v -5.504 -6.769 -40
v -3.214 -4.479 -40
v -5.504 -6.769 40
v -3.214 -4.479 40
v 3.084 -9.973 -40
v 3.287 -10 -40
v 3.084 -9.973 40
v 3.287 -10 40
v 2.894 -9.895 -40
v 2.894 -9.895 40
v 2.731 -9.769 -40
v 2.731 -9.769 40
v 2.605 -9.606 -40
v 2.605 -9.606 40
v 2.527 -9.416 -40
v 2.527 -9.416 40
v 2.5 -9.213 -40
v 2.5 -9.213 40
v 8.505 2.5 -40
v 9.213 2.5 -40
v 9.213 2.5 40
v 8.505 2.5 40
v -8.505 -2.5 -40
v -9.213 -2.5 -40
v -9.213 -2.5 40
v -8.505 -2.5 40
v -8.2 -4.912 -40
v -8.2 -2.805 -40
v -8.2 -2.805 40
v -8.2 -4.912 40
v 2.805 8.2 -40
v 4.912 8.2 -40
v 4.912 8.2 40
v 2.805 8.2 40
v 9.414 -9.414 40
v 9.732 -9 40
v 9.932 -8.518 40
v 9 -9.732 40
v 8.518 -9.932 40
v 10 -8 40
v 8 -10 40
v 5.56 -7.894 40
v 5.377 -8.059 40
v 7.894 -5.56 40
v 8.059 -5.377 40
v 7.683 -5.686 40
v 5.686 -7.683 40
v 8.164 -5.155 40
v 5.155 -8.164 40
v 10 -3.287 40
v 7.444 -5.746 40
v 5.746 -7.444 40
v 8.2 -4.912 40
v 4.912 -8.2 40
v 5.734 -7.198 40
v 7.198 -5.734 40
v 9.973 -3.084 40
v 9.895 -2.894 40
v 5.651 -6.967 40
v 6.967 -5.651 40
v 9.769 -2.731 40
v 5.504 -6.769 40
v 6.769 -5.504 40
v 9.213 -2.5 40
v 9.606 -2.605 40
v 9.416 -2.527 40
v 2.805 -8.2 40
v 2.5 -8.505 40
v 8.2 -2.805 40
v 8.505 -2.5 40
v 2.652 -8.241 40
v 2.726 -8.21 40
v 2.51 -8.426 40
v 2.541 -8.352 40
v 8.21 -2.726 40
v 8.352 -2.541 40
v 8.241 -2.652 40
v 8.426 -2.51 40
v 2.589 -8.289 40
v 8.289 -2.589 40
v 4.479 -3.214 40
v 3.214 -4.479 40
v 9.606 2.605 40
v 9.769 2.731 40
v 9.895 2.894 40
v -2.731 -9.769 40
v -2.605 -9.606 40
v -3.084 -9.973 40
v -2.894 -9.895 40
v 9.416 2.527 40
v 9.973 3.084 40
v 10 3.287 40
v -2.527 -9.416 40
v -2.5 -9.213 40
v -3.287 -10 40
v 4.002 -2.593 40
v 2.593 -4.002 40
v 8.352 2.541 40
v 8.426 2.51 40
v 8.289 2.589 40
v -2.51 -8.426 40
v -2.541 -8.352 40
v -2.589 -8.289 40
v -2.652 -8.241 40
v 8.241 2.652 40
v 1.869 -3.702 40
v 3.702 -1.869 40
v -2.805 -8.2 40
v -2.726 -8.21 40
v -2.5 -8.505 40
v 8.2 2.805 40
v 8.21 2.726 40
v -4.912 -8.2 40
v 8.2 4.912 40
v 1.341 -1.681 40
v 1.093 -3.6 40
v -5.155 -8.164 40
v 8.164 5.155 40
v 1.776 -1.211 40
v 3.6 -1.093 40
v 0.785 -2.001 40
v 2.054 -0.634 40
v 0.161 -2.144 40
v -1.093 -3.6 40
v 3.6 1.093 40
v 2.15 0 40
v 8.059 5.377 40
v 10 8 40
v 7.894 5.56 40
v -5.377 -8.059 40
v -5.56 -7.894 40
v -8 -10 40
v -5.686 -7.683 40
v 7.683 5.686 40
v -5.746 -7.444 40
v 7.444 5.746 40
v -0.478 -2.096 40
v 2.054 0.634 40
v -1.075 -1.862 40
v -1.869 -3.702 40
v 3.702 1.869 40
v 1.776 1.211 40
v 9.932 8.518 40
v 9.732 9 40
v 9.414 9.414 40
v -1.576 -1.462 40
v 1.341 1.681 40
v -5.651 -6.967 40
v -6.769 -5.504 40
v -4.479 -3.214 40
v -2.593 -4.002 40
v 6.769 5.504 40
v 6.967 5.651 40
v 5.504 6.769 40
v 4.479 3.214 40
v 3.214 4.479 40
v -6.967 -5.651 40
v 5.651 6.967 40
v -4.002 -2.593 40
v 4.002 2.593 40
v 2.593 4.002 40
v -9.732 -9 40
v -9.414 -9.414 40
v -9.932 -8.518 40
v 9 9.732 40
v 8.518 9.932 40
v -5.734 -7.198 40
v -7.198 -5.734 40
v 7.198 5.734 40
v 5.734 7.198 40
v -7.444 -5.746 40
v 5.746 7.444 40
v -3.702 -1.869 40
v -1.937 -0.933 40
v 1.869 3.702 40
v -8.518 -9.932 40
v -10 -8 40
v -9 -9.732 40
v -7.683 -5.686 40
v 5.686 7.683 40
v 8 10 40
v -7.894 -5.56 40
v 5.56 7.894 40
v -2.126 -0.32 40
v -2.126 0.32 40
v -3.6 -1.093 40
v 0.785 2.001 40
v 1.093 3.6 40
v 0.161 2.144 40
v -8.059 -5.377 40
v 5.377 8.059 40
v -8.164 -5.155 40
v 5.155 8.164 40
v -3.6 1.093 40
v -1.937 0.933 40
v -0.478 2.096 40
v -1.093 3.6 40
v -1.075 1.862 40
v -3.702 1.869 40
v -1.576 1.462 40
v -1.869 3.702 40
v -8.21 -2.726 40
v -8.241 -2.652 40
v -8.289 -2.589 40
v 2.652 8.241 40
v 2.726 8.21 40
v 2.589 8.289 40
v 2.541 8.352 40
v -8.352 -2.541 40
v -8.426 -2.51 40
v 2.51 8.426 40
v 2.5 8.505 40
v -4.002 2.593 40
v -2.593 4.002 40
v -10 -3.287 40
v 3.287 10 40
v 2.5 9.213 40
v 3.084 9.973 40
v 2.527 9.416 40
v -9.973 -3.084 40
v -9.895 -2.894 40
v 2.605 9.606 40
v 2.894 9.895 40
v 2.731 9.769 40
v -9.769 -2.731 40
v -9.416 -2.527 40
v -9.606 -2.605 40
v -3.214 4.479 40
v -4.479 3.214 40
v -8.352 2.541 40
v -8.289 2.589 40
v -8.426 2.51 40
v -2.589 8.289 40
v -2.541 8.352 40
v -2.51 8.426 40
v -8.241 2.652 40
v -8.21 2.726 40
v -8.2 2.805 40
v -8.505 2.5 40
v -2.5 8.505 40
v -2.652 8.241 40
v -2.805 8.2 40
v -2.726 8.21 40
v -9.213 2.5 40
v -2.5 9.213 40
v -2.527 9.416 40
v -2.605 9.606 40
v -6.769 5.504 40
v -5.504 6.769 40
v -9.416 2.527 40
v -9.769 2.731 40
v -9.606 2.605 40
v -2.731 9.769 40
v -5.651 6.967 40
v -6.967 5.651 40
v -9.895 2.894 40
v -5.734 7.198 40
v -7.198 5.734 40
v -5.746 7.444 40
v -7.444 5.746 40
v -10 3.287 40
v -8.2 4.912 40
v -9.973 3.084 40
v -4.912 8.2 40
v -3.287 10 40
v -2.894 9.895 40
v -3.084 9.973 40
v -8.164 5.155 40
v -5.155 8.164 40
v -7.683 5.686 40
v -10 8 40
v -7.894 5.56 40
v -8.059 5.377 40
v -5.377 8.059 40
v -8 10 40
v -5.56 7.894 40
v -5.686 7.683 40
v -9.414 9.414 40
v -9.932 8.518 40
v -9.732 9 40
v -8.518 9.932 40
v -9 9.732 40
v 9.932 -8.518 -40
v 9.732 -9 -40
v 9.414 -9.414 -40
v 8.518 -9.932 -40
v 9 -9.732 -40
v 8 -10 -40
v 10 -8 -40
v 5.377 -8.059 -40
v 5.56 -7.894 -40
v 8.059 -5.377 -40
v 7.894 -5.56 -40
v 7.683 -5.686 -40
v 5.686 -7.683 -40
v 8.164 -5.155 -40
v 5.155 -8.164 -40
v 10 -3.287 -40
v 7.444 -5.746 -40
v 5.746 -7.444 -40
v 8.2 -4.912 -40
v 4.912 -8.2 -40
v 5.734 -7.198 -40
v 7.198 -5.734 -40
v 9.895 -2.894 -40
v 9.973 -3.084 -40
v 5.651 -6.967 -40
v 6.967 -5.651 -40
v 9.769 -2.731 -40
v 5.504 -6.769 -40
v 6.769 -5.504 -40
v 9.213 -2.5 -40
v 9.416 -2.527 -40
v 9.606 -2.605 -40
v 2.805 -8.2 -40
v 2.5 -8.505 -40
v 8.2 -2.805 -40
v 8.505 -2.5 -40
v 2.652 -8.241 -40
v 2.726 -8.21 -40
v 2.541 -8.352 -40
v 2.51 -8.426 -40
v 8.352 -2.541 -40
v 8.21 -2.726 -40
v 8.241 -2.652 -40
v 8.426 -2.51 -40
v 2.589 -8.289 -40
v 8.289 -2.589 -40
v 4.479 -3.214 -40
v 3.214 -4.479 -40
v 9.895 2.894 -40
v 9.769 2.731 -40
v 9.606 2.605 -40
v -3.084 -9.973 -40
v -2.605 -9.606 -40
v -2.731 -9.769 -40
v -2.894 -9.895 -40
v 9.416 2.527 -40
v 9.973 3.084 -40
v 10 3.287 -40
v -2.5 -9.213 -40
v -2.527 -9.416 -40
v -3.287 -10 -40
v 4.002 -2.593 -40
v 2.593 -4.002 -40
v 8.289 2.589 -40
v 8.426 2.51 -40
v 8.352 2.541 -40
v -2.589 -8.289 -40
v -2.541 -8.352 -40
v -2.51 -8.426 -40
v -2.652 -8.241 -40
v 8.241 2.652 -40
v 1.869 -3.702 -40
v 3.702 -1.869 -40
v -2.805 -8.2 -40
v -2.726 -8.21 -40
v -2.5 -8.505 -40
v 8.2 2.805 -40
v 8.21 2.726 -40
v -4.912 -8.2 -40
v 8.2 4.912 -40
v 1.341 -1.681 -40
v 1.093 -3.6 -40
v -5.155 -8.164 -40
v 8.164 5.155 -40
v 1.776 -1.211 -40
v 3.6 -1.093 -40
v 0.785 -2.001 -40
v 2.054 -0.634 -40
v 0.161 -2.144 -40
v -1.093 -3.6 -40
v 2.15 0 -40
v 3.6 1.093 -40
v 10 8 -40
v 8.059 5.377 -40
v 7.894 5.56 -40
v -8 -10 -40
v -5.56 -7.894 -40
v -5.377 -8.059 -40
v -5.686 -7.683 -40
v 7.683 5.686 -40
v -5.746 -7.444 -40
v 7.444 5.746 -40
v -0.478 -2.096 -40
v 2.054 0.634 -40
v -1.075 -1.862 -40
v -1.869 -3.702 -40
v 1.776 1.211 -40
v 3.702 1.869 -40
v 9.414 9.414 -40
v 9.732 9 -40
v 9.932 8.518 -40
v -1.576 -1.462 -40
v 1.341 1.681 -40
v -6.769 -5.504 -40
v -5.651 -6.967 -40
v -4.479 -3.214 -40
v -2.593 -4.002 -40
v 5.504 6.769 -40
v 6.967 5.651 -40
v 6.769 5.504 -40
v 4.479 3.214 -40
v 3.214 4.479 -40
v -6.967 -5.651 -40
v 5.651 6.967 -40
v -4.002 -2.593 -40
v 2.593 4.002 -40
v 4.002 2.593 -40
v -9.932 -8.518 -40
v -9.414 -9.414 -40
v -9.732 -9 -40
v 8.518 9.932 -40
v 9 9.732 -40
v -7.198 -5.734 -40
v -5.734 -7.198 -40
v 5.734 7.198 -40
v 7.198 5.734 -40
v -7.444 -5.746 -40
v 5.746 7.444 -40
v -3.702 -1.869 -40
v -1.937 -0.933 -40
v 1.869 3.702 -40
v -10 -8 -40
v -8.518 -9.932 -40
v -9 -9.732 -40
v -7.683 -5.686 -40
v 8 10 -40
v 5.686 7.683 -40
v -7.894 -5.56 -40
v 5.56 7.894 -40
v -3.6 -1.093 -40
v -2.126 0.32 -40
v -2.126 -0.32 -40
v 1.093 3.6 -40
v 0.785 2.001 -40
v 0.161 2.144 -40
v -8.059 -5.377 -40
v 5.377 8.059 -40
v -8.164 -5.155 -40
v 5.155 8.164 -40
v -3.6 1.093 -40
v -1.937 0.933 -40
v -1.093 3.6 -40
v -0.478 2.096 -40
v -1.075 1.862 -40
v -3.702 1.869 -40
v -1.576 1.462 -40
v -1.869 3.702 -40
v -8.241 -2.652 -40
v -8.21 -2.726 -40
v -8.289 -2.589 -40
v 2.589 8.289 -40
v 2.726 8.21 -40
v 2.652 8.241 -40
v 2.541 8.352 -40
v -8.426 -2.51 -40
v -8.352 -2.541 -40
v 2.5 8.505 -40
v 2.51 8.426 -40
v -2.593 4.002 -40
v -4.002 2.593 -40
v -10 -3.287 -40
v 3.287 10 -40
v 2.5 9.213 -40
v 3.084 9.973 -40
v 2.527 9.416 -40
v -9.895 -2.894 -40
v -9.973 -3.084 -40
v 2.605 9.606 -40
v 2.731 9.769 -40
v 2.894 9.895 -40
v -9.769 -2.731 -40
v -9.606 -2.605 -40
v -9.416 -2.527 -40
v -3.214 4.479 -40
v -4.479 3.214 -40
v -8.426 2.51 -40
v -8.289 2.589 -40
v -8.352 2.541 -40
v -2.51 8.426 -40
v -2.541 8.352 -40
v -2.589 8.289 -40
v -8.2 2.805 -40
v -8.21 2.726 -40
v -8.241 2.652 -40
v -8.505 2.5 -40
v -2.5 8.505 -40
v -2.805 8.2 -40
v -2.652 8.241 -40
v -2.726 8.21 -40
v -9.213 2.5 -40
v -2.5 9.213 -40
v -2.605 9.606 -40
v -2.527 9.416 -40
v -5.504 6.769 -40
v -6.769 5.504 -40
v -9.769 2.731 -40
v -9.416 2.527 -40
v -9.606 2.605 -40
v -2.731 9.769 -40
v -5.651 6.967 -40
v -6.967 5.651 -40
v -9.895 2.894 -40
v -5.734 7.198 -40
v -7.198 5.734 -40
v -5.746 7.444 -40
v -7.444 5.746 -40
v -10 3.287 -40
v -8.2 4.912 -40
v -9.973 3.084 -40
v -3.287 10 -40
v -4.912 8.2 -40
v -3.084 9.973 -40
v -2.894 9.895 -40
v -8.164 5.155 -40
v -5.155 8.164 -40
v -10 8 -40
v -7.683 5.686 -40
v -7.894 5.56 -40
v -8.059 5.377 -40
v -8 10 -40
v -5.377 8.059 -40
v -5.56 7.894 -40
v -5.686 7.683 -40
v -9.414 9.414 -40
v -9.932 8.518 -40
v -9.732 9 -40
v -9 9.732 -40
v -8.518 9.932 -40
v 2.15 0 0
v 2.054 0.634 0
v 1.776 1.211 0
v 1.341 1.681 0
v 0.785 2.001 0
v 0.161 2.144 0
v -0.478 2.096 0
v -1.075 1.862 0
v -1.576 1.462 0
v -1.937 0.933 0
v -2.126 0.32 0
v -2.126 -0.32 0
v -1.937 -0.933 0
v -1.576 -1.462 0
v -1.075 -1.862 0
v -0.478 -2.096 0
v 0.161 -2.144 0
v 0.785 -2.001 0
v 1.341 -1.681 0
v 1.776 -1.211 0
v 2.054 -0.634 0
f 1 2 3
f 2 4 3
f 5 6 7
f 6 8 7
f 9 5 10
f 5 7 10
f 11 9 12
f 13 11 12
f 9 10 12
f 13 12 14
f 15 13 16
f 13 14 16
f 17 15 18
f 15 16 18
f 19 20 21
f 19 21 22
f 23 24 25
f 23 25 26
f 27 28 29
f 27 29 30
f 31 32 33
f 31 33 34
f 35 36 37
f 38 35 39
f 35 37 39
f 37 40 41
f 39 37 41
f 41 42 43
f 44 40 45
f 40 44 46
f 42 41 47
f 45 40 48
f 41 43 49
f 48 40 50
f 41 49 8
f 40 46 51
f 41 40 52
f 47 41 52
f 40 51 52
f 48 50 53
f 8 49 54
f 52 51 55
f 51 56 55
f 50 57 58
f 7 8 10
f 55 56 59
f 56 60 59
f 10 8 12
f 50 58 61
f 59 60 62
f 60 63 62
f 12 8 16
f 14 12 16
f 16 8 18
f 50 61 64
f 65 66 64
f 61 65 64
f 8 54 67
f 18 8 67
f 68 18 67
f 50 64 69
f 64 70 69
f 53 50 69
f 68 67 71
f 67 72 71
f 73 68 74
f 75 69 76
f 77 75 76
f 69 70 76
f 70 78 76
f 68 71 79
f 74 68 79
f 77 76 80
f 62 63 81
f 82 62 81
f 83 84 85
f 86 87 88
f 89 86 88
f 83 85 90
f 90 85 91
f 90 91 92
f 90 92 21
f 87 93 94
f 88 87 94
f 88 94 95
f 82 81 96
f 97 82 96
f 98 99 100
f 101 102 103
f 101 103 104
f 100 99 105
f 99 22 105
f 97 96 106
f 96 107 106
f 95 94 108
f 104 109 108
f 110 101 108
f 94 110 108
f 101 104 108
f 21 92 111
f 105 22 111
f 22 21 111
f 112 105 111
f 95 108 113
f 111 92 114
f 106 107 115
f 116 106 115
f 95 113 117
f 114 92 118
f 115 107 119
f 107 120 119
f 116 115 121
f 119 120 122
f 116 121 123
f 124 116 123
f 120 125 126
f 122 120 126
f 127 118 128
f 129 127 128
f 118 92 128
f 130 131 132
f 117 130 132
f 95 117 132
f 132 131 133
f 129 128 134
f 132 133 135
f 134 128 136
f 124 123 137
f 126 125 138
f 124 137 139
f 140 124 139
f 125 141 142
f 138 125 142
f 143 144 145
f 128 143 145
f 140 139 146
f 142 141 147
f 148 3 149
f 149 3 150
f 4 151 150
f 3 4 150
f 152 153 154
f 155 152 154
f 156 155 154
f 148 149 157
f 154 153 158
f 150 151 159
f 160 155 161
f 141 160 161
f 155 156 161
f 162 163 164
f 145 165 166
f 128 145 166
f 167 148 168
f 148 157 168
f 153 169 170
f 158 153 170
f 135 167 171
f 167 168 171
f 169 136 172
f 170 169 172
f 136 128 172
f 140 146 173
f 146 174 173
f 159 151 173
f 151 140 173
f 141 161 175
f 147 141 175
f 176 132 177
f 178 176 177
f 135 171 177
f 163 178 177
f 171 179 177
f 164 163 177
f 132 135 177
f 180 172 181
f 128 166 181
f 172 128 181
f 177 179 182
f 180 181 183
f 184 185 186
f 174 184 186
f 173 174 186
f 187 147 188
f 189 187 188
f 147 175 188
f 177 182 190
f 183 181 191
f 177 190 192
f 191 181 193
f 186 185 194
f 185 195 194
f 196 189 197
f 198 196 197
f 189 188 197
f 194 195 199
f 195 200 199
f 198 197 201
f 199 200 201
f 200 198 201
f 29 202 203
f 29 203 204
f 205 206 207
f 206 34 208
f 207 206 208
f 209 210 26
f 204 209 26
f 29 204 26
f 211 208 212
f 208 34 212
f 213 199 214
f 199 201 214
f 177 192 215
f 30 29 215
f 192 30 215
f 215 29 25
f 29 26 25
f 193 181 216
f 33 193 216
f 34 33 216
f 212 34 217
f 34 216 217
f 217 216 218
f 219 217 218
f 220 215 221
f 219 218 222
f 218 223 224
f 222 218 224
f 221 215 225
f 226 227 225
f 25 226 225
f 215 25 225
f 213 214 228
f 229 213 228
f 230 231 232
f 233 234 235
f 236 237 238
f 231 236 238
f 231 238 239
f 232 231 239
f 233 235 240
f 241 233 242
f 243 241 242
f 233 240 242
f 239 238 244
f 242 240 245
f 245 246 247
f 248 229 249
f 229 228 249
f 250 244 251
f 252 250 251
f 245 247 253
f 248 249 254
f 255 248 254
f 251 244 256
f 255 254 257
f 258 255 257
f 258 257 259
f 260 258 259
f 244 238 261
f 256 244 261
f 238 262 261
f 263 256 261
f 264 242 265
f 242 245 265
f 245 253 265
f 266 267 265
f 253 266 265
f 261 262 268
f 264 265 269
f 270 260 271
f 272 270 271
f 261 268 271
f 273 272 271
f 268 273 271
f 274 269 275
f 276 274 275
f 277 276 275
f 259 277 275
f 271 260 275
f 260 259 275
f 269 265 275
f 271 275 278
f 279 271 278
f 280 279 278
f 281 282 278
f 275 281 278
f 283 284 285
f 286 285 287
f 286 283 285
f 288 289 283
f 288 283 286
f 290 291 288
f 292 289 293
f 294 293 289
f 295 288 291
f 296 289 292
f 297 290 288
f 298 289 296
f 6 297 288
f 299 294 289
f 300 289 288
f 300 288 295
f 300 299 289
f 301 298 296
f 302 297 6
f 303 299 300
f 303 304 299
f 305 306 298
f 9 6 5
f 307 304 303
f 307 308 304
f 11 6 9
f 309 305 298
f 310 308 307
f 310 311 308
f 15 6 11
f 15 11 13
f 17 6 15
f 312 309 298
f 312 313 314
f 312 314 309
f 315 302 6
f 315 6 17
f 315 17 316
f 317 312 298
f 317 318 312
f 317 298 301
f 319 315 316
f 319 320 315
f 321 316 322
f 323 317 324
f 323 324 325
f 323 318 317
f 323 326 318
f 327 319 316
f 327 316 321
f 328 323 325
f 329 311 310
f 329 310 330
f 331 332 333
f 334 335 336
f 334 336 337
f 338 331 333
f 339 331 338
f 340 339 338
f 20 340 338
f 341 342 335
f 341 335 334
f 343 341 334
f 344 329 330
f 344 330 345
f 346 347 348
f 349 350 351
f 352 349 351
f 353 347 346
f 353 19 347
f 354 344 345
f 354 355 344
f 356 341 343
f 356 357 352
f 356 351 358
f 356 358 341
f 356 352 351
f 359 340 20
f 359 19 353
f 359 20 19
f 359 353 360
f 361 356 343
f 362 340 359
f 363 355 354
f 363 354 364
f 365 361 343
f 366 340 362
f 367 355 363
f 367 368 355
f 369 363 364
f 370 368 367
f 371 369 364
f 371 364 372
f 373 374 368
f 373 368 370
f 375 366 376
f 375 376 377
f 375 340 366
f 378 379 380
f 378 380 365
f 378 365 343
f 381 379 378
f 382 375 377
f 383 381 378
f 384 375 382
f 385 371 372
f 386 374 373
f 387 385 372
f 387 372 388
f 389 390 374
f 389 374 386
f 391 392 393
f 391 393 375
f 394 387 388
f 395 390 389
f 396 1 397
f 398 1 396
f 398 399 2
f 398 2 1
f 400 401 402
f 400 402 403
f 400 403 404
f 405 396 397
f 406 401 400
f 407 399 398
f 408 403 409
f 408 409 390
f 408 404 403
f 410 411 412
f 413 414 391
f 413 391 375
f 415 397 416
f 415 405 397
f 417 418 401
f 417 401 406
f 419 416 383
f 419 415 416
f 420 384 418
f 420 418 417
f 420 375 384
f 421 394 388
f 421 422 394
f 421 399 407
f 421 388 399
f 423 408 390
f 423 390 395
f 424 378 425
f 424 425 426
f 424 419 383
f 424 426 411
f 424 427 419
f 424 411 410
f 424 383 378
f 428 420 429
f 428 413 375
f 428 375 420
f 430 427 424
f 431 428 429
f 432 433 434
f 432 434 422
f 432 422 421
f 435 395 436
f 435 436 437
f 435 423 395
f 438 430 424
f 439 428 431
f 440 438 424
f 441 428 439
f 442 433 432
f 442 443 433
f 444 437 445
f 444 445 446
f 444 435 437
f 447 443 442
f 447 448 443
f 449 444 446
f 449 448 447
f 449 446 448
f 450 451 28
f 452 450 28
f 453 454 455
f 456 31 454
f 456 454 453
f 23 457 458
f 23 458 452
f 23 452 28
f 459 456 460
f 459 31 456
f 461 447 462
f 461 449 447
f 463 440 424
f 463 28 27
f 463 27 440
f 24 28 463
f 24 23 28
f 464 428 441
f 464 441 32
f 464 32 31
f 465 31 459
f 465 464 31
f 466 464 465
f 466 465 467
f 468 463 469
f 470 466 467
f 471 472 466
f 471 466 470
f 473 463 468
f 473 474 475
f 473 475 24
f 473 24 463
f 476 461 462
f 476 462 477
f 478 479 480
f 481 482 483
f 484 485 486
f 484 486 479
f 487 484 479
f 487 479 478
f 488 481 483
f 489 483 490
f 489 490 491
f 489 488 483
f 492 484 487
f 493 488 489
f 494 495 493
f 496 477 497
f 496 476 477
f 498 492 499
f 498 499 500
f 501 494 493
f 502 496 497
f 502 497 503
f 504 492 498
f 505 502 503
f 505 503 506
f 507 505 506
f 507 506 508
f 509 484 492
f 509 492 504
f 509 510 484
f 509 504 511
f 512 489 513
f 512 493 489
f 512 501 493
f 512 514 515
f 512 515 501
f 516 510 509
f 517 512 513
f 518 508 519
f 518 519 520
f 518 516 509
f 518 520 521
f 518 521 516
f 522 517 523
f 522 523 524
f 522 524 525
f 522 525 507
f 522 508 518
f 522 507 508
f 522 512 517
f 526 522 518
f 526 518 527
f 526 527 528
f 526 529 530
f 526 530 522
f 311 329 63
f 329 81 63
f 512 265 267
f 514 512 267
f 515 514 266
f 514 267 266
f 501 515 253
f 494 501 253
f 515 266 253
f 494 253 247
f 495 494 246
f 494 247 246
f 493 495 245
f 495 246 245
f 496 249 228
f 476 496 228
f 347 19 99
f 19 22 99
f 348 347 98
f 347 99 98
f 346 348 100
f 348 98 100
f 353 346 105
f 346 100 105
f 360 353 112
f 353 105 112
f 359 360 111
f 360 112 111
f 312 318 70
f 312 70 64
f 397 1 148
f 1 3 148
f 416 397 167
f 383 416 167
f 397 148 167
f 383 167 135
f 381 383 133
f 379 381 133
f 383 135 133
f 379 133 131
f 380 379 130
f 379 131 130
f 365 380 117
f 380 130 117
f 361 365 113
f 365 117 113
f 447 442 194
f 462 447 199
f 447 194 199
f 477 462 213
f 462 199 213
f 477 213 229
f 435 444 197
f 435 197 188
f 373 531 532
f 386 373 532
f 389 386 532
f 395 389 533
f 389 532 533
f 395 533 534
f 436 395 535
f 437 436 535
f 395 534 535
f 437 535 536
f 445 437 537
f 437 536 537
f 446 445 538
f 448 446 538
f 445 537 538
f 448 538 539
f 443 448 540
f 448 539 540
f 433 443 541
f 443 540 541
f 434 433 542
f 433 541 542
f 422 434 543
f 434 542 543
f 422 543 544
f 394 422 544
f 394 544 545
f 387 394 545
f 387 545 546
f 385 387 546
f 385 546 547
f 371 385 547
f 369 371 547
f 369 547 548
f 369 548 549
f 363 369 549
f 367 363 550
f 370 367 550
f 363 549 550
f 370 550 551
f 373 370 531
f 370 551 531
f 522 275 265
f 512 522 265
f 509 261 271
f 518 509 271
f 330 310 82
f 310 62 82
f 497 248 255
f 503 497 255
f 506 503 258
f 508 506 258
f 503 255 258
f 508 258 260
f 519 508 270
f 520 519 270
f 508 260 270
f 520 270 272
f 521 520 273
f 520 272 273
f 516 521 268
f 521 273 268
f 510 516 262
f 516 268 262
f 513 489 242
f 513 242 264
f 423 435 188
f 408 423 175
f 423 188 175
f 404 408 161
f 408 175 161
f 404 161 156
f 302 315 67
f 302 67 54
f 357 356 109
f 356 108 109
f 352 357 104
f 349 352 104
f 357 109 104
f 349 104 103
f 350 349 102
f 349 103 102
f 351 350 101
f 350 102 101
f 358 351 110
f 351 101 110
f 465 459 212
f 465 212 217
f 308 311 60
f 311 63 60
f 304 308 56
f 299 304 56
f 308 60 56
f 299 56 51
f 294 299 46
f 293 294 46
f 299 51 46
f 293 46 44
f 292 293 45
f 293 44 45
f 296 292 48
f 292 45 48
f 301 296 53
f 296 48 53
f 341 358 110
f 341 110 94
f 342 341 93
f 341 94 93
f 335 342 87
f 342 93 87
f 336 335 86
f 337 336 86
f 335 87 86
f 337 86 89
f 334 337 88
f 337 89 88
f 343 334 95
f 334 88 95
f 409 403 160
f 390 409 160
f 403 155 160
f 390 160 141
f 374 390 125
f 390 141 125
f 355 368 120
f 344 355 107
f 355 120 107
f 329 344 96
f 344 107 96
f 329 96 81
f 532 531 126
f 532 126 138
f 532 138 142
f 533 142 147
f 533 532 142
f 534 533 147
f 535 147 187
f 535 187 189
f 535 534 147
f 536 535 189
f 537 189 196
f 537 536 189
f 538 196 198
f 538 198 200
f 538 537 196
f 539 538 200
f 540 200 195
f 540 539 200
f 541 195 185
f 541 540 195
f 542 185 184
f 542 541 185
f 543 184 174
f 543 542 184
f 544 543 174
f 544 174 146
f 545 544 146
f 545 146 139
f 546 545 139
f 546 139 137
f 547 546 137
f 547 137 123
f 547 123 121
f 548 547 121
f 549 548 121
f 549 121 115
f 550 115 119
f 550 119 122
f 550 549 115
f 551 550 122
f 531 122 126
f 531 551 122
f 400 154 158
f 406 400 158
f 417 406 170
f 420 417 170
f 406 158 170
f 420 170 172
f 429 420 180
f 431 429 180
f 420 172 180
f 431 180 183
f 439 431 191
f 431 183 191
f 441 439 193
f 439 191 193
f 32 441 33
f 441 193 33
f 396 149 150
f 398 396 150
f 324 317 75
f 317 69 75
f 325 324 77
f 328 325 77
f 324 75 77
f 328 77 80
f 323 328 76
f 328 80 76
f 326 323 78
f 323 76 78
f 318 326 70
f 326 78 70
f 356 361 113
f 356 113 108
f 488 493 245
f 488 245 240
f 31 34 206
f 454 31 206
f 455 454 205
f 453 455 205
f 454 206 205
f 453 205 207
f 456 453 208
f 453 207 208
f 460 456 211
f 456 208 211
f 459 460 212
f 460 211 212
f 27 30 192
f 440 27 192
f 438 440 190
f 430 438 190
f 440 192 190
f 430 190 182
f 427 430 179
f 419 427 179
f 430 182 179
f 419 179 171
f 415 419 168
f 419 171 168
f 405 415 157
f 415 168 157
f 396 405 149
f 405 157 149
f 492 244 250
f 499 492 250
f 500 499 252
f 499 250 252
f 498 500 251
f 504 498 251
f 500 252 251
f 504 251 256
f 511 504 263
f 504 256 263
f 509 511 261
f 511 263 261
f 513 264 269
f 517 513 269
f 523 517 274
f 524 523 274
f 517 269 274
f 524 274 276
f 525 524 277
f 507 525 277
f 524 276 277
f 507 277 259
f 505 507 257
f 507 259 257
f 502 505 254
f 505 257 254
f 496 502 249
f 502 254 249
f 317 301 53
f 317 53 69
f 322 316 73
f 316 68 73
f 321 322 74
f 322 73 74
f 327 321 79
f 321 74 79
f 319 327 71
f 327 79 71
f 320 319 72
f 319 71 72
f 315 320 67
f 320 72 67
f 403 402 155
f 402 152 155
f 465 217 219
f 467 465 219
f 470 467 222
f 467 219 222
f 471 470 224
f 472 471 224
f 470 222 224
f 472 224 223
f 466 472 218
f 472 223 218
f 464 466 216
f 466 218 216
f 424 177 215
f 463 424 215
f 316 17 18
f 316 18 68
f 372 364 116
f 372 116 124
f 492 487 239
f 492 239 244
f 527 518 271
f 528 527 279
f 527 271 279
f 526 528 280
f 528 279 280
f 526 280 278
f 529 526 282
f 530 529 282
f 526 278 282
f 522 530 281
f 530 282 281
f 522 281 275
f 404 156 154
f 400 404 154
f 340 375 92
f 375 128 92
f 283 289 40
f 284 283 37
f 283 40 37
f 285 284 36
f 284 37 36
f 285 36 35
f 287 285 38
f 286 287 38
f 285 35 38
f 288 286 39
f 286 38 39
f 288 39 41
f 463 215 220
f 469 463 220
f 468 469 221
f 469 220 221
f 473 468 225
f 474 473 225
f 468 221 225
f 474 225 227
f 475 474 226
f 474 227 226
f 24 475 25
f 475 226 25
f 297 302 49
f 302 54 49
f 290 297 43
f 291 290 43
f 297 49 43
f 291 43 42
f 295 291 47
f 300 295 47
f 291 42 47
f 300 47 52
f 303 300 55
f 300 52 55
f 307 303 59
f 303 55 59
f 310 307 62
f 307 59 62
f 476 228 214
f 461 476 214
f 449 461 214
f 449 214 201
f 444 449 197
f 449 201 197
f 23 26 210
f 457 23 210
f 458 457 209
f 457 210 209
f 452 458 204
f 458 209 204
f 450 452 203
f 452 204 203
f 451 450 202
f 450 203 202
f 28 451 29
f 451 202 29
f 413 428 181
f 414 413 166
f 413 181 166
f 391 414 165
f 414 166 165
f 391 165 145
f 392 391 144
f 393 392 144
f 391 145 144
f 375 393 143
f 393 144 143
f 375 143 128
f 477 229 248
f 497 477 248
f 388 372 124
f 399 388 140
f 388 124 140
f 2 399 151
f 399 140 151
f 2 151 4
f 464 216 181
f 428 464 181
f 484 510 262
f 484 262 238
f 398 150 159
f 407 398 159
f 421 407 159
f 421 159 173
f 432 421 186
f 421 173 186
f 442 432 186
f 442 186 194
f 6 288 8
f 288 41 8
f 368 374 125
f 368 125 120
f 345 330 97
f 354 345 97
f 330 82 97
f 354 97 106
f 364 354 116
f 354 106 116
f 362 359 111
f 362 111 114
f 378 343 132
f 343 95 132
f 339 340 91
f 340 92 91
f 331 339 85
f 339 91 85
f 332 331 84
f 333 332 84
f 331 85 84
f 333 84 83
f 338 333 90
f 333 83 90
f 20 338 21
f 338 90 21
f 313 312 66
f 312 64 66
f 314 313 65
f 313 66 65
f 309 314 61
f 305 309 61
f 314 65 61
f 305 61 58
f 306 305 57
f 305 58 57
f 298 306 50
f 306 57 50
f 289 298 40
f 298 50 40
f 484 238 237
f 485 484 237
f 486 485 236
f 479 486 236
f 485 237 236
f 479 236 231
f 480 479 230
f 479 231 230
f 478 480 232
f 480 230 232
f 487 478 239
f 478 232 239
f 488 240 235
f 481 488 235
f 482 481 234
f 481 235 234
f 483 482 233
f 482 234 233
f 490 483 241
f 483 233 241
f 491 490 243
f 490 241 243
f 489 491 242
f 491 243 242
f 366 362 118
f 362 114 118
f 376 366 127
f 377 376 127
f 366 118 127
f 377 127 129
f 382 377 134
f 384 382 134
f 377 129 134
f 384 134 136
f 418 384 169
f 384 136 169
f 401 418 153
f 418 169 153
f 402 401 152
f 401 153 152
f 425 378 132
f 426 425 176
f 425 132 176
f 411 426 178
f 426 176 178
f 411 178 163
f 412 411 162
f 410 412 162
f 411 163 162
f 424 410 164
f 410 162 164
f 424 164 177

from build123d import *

# Parameters (mm, degrees)
SKETCH3_R                = 2.15
BOSS_EXTRUDE1_DEPTH      = 40
BOSS_EXTRUDE1_DEPTH_BACK = 40


with BuildPart() as part:
    # Sketch3 → Boss-Extrude1 (new body, two sides)
    with BuildSketch(Plane.XY) as boss_extrude1_sk:
        with BuildLine():
            Line((3.2874, 10), (8, 10))
            ThreePointArc((8, 10), (9.414213562, 9.414213562), (10, 8))
            Line((10, 8), (10, 3.2874))
            ThreePointArc((10, 3.2874), (9.76937588, 2.73062412), (9.2126, 2.5))
            Line((9.2126, 2.5), (8.5048, 2.5))
            ThreePointArc((8.5048, 2.5), (8.289273853, 2.589273853), (8.2, 2.8048))
            Line((8.2, 2.8048), (8.2, 4.9118))
            ThreePointArc((8.2, 4.9118), (7.682565253, 5.686195824), (6.769103096, 5.504496904))
            Line((6.769103096, 5.504496904), (4.478679656, 3.214073464))
            ThreePointArc((4.478679656, 3.214073464), (3.828361402, 2.240803418), (3.6, 1.092753121))
            Line((3.6, 1.092753121), (3.6, -1.092753121))
            ThreePointArc((3.6, -1.092753121), (3.828361402, -2.240803418), (4.478679656, -3.214073464))
            Line((4.478679656, -3.214073464), (6.769103096, -5.504496904))
            ThreePointArc((6.769103096, -5.504496904), (7.682565253, -5.686195824), (8.2, -4.9118))
            Line((8.2, -4.9118), (8.2, -2.8048))
            ThreePointArc((8.2, -2.8048), (8.289273853, -2.589273853), (8.5048, -2.5))
            Line((8.5048, -2.5), (9.2126, -2.5))
            ThreePointArc((9.2126, -2.5), (9.76937588, -2.73062412), (10, -3.2874))
            Line((10, -3.2874), (10, -8))
            ThreePointArc((10, -8), (9.414213562, -9.414213562), (8, -10))
            Line((8, -10), (3.2874, -10))
            ThreePointArc((3.2874, -10), (2.73062412, -9.76937588), (2.5, -9.2126))
            Line((2.5, -9.2126), (2.5, -8.5048))
            ThreePointArc((2.5, -8.5048), (2.589273853, -8.289273853), (2.8048, -8.2))
            Line((2.8048, -8.2), (4.9118, -8.2))
            ThreePointArc((4.9118, -8.2), (5.686195824, -7.682565253), (5.504496904, -6.769103096))
            Line((5.504496904, -6.769103096), (3.214073464, -4.478679656))
            ThreePointArc((3.214073464, -4.478679656), (2.240803418, -3.828361402), (1.092753121, -3.6))
            Line((1.092753121, -3.6), (-1.092753121, -3.6))
            ThreePointArc((-1.092753121, -3.6), (-2.240803418, -3.828361402), (-3.214073464, -4.478679656))
            Line((-3.214073464, -4.478679656), (-5.504496904, -6.769103096))
            ThreePointArc((-5.504496904, -6.769103096), (-5.686195824, -7.682565253), (-4.9118, -8.2))
            Line((-4.9118, -8.2), (-2.8048, -8.2))
            ThreePointArc((-2.8048, -8.2), (-2.589273853, -8.289273853), (-2.5, -8.5048))
            Line((-2.5, -8.5048), (-2.5, -9.2126))
            ThreePointArc((-2.5, -9.2126), (-2.73062412, -9.76937588), (-3.2874, -10))
            Line((-3.2874, -10), (-8, -10))
            ThreePointArc((-8, -10), (-9.414213562, -9.414213562), (-10, -8))
            Line((-10, -8), (-10, -3.2874))
            ThreePointArc((-10, -3.2874), (-9.76937588, -2.73062412), (-9.2126, -2.5))
            Line((-9.2126, -2.5), (-8.5048, -2.5))
            ThreePointArc((-8.5048, -2.5), (-8.289273853, -2.589273853), (-8.2, -2.8048))
            Line((-8.2, -2.8048), (-8.2, -4.9118))
            ThreePointArc((-8.2, -4.9118), (-7.682565253, -5.686195824), (-6.769103096, -5.504496904))
            Line((-6.769103096, -5.504496904), (-4.478679656, -3.214073464))
            ThreePointArc((-4.478679656, -3.214073464), (-3.828361402, -2.240803418), (-3.6, -1.092753121))
            Line((-3.6, -1.092753121), (-3.6, 1.092753121))
            ThreePointArc((-3.6, 1.092753121), (-3.828361402, 2.240803418), (-4.478679656, 3.214073464))
            Line((-4.478679656, 3.214073464), (-6.769103096, 5.504496904))
            ThreePointArc((-6.769103096, 5.504496904), (-7.682565253, 5.686195824), (-8.2, 4.9118))
            Line((-8.2, 4.9118), (-8.2, 2.8048))
            ThreePointArc((-8.2, 2.8048), (-8.289273853, 2.589273853), (-8.5048, 2.5))
            Line((-8.5048, 2.5), (-9.2126, 2.5))
            ThreePointArc((-9.2126, 2.5), (-9.76937588, 2.73062412), (-10, 3.2874))
            Line((-10, 3.2874), (-10, 8))
            ThreePointArc((-10, 8), (-9.414213562, 9.414213562), (-8, 10))
            Line((-8, 10), (-3.2874, 10))
            ThreePointArc((-3.2874, 10), (-2.73062412, 9.76937588), (-2.5, 9.2126))
            Line((-2.5, 9.2126), (-2.5, 8.5048))
            ThreePointArc((-2.5, 8.5048), (-2.589273853, 8.289273853), (-2.8048, 8.2))
            Line((-2.8048, 8.2), (-4.9118, 8.2))
            ThreePointArc((-4.9118, 8.2), (-5.686195824, 7.682565253), (-5.504496904, 6.769103096))
            Line((-5.504496904, 6.769103096), (-3.214073464, 4.478679656))
            ThreePointArc((-3.214073464, 4.478679656), (-2.240803418, 3.828361402), (-1.092753121, 3.6))
            Line((-1.092753121, 3.6), (1.092753121, 3.6))
            ThreePointArc((1.092753121, 3.6), (2.240803418, 3.828361402), (3.214073464, 4.478679656))
            Line((3.214073464, 4.478679656), (5.504496904, 6.769103096))
            ThreePointArc((5.504496904, 6.769103096), (5.686195824, 7.682565253), (4.9118, 8.2))
            Line((4.9118, 8.2), (2.8048, 8.2))
            ThreePointArc((2.8048, 8.2), (2.589273853, 8.289273853), (2.5, 8.5048))
            Line((2.5, 8.5048), (2.5, 9.2126))
            ThreePointArc((2.5, 9.2126), (2.73062412, 9.76937588), (3.2874, 10))
        make_face()
        Circle(SKETCH3_R, mode=Mode.SUBTRACT)
    extrude(amount=BOSS_EXTRUDE1_DEPTH)
    extrude(boss_extrude1_sk.sketch, amount=-BOSS_EXTRUDE1_DEPTH_BACK)


solid = part.part
